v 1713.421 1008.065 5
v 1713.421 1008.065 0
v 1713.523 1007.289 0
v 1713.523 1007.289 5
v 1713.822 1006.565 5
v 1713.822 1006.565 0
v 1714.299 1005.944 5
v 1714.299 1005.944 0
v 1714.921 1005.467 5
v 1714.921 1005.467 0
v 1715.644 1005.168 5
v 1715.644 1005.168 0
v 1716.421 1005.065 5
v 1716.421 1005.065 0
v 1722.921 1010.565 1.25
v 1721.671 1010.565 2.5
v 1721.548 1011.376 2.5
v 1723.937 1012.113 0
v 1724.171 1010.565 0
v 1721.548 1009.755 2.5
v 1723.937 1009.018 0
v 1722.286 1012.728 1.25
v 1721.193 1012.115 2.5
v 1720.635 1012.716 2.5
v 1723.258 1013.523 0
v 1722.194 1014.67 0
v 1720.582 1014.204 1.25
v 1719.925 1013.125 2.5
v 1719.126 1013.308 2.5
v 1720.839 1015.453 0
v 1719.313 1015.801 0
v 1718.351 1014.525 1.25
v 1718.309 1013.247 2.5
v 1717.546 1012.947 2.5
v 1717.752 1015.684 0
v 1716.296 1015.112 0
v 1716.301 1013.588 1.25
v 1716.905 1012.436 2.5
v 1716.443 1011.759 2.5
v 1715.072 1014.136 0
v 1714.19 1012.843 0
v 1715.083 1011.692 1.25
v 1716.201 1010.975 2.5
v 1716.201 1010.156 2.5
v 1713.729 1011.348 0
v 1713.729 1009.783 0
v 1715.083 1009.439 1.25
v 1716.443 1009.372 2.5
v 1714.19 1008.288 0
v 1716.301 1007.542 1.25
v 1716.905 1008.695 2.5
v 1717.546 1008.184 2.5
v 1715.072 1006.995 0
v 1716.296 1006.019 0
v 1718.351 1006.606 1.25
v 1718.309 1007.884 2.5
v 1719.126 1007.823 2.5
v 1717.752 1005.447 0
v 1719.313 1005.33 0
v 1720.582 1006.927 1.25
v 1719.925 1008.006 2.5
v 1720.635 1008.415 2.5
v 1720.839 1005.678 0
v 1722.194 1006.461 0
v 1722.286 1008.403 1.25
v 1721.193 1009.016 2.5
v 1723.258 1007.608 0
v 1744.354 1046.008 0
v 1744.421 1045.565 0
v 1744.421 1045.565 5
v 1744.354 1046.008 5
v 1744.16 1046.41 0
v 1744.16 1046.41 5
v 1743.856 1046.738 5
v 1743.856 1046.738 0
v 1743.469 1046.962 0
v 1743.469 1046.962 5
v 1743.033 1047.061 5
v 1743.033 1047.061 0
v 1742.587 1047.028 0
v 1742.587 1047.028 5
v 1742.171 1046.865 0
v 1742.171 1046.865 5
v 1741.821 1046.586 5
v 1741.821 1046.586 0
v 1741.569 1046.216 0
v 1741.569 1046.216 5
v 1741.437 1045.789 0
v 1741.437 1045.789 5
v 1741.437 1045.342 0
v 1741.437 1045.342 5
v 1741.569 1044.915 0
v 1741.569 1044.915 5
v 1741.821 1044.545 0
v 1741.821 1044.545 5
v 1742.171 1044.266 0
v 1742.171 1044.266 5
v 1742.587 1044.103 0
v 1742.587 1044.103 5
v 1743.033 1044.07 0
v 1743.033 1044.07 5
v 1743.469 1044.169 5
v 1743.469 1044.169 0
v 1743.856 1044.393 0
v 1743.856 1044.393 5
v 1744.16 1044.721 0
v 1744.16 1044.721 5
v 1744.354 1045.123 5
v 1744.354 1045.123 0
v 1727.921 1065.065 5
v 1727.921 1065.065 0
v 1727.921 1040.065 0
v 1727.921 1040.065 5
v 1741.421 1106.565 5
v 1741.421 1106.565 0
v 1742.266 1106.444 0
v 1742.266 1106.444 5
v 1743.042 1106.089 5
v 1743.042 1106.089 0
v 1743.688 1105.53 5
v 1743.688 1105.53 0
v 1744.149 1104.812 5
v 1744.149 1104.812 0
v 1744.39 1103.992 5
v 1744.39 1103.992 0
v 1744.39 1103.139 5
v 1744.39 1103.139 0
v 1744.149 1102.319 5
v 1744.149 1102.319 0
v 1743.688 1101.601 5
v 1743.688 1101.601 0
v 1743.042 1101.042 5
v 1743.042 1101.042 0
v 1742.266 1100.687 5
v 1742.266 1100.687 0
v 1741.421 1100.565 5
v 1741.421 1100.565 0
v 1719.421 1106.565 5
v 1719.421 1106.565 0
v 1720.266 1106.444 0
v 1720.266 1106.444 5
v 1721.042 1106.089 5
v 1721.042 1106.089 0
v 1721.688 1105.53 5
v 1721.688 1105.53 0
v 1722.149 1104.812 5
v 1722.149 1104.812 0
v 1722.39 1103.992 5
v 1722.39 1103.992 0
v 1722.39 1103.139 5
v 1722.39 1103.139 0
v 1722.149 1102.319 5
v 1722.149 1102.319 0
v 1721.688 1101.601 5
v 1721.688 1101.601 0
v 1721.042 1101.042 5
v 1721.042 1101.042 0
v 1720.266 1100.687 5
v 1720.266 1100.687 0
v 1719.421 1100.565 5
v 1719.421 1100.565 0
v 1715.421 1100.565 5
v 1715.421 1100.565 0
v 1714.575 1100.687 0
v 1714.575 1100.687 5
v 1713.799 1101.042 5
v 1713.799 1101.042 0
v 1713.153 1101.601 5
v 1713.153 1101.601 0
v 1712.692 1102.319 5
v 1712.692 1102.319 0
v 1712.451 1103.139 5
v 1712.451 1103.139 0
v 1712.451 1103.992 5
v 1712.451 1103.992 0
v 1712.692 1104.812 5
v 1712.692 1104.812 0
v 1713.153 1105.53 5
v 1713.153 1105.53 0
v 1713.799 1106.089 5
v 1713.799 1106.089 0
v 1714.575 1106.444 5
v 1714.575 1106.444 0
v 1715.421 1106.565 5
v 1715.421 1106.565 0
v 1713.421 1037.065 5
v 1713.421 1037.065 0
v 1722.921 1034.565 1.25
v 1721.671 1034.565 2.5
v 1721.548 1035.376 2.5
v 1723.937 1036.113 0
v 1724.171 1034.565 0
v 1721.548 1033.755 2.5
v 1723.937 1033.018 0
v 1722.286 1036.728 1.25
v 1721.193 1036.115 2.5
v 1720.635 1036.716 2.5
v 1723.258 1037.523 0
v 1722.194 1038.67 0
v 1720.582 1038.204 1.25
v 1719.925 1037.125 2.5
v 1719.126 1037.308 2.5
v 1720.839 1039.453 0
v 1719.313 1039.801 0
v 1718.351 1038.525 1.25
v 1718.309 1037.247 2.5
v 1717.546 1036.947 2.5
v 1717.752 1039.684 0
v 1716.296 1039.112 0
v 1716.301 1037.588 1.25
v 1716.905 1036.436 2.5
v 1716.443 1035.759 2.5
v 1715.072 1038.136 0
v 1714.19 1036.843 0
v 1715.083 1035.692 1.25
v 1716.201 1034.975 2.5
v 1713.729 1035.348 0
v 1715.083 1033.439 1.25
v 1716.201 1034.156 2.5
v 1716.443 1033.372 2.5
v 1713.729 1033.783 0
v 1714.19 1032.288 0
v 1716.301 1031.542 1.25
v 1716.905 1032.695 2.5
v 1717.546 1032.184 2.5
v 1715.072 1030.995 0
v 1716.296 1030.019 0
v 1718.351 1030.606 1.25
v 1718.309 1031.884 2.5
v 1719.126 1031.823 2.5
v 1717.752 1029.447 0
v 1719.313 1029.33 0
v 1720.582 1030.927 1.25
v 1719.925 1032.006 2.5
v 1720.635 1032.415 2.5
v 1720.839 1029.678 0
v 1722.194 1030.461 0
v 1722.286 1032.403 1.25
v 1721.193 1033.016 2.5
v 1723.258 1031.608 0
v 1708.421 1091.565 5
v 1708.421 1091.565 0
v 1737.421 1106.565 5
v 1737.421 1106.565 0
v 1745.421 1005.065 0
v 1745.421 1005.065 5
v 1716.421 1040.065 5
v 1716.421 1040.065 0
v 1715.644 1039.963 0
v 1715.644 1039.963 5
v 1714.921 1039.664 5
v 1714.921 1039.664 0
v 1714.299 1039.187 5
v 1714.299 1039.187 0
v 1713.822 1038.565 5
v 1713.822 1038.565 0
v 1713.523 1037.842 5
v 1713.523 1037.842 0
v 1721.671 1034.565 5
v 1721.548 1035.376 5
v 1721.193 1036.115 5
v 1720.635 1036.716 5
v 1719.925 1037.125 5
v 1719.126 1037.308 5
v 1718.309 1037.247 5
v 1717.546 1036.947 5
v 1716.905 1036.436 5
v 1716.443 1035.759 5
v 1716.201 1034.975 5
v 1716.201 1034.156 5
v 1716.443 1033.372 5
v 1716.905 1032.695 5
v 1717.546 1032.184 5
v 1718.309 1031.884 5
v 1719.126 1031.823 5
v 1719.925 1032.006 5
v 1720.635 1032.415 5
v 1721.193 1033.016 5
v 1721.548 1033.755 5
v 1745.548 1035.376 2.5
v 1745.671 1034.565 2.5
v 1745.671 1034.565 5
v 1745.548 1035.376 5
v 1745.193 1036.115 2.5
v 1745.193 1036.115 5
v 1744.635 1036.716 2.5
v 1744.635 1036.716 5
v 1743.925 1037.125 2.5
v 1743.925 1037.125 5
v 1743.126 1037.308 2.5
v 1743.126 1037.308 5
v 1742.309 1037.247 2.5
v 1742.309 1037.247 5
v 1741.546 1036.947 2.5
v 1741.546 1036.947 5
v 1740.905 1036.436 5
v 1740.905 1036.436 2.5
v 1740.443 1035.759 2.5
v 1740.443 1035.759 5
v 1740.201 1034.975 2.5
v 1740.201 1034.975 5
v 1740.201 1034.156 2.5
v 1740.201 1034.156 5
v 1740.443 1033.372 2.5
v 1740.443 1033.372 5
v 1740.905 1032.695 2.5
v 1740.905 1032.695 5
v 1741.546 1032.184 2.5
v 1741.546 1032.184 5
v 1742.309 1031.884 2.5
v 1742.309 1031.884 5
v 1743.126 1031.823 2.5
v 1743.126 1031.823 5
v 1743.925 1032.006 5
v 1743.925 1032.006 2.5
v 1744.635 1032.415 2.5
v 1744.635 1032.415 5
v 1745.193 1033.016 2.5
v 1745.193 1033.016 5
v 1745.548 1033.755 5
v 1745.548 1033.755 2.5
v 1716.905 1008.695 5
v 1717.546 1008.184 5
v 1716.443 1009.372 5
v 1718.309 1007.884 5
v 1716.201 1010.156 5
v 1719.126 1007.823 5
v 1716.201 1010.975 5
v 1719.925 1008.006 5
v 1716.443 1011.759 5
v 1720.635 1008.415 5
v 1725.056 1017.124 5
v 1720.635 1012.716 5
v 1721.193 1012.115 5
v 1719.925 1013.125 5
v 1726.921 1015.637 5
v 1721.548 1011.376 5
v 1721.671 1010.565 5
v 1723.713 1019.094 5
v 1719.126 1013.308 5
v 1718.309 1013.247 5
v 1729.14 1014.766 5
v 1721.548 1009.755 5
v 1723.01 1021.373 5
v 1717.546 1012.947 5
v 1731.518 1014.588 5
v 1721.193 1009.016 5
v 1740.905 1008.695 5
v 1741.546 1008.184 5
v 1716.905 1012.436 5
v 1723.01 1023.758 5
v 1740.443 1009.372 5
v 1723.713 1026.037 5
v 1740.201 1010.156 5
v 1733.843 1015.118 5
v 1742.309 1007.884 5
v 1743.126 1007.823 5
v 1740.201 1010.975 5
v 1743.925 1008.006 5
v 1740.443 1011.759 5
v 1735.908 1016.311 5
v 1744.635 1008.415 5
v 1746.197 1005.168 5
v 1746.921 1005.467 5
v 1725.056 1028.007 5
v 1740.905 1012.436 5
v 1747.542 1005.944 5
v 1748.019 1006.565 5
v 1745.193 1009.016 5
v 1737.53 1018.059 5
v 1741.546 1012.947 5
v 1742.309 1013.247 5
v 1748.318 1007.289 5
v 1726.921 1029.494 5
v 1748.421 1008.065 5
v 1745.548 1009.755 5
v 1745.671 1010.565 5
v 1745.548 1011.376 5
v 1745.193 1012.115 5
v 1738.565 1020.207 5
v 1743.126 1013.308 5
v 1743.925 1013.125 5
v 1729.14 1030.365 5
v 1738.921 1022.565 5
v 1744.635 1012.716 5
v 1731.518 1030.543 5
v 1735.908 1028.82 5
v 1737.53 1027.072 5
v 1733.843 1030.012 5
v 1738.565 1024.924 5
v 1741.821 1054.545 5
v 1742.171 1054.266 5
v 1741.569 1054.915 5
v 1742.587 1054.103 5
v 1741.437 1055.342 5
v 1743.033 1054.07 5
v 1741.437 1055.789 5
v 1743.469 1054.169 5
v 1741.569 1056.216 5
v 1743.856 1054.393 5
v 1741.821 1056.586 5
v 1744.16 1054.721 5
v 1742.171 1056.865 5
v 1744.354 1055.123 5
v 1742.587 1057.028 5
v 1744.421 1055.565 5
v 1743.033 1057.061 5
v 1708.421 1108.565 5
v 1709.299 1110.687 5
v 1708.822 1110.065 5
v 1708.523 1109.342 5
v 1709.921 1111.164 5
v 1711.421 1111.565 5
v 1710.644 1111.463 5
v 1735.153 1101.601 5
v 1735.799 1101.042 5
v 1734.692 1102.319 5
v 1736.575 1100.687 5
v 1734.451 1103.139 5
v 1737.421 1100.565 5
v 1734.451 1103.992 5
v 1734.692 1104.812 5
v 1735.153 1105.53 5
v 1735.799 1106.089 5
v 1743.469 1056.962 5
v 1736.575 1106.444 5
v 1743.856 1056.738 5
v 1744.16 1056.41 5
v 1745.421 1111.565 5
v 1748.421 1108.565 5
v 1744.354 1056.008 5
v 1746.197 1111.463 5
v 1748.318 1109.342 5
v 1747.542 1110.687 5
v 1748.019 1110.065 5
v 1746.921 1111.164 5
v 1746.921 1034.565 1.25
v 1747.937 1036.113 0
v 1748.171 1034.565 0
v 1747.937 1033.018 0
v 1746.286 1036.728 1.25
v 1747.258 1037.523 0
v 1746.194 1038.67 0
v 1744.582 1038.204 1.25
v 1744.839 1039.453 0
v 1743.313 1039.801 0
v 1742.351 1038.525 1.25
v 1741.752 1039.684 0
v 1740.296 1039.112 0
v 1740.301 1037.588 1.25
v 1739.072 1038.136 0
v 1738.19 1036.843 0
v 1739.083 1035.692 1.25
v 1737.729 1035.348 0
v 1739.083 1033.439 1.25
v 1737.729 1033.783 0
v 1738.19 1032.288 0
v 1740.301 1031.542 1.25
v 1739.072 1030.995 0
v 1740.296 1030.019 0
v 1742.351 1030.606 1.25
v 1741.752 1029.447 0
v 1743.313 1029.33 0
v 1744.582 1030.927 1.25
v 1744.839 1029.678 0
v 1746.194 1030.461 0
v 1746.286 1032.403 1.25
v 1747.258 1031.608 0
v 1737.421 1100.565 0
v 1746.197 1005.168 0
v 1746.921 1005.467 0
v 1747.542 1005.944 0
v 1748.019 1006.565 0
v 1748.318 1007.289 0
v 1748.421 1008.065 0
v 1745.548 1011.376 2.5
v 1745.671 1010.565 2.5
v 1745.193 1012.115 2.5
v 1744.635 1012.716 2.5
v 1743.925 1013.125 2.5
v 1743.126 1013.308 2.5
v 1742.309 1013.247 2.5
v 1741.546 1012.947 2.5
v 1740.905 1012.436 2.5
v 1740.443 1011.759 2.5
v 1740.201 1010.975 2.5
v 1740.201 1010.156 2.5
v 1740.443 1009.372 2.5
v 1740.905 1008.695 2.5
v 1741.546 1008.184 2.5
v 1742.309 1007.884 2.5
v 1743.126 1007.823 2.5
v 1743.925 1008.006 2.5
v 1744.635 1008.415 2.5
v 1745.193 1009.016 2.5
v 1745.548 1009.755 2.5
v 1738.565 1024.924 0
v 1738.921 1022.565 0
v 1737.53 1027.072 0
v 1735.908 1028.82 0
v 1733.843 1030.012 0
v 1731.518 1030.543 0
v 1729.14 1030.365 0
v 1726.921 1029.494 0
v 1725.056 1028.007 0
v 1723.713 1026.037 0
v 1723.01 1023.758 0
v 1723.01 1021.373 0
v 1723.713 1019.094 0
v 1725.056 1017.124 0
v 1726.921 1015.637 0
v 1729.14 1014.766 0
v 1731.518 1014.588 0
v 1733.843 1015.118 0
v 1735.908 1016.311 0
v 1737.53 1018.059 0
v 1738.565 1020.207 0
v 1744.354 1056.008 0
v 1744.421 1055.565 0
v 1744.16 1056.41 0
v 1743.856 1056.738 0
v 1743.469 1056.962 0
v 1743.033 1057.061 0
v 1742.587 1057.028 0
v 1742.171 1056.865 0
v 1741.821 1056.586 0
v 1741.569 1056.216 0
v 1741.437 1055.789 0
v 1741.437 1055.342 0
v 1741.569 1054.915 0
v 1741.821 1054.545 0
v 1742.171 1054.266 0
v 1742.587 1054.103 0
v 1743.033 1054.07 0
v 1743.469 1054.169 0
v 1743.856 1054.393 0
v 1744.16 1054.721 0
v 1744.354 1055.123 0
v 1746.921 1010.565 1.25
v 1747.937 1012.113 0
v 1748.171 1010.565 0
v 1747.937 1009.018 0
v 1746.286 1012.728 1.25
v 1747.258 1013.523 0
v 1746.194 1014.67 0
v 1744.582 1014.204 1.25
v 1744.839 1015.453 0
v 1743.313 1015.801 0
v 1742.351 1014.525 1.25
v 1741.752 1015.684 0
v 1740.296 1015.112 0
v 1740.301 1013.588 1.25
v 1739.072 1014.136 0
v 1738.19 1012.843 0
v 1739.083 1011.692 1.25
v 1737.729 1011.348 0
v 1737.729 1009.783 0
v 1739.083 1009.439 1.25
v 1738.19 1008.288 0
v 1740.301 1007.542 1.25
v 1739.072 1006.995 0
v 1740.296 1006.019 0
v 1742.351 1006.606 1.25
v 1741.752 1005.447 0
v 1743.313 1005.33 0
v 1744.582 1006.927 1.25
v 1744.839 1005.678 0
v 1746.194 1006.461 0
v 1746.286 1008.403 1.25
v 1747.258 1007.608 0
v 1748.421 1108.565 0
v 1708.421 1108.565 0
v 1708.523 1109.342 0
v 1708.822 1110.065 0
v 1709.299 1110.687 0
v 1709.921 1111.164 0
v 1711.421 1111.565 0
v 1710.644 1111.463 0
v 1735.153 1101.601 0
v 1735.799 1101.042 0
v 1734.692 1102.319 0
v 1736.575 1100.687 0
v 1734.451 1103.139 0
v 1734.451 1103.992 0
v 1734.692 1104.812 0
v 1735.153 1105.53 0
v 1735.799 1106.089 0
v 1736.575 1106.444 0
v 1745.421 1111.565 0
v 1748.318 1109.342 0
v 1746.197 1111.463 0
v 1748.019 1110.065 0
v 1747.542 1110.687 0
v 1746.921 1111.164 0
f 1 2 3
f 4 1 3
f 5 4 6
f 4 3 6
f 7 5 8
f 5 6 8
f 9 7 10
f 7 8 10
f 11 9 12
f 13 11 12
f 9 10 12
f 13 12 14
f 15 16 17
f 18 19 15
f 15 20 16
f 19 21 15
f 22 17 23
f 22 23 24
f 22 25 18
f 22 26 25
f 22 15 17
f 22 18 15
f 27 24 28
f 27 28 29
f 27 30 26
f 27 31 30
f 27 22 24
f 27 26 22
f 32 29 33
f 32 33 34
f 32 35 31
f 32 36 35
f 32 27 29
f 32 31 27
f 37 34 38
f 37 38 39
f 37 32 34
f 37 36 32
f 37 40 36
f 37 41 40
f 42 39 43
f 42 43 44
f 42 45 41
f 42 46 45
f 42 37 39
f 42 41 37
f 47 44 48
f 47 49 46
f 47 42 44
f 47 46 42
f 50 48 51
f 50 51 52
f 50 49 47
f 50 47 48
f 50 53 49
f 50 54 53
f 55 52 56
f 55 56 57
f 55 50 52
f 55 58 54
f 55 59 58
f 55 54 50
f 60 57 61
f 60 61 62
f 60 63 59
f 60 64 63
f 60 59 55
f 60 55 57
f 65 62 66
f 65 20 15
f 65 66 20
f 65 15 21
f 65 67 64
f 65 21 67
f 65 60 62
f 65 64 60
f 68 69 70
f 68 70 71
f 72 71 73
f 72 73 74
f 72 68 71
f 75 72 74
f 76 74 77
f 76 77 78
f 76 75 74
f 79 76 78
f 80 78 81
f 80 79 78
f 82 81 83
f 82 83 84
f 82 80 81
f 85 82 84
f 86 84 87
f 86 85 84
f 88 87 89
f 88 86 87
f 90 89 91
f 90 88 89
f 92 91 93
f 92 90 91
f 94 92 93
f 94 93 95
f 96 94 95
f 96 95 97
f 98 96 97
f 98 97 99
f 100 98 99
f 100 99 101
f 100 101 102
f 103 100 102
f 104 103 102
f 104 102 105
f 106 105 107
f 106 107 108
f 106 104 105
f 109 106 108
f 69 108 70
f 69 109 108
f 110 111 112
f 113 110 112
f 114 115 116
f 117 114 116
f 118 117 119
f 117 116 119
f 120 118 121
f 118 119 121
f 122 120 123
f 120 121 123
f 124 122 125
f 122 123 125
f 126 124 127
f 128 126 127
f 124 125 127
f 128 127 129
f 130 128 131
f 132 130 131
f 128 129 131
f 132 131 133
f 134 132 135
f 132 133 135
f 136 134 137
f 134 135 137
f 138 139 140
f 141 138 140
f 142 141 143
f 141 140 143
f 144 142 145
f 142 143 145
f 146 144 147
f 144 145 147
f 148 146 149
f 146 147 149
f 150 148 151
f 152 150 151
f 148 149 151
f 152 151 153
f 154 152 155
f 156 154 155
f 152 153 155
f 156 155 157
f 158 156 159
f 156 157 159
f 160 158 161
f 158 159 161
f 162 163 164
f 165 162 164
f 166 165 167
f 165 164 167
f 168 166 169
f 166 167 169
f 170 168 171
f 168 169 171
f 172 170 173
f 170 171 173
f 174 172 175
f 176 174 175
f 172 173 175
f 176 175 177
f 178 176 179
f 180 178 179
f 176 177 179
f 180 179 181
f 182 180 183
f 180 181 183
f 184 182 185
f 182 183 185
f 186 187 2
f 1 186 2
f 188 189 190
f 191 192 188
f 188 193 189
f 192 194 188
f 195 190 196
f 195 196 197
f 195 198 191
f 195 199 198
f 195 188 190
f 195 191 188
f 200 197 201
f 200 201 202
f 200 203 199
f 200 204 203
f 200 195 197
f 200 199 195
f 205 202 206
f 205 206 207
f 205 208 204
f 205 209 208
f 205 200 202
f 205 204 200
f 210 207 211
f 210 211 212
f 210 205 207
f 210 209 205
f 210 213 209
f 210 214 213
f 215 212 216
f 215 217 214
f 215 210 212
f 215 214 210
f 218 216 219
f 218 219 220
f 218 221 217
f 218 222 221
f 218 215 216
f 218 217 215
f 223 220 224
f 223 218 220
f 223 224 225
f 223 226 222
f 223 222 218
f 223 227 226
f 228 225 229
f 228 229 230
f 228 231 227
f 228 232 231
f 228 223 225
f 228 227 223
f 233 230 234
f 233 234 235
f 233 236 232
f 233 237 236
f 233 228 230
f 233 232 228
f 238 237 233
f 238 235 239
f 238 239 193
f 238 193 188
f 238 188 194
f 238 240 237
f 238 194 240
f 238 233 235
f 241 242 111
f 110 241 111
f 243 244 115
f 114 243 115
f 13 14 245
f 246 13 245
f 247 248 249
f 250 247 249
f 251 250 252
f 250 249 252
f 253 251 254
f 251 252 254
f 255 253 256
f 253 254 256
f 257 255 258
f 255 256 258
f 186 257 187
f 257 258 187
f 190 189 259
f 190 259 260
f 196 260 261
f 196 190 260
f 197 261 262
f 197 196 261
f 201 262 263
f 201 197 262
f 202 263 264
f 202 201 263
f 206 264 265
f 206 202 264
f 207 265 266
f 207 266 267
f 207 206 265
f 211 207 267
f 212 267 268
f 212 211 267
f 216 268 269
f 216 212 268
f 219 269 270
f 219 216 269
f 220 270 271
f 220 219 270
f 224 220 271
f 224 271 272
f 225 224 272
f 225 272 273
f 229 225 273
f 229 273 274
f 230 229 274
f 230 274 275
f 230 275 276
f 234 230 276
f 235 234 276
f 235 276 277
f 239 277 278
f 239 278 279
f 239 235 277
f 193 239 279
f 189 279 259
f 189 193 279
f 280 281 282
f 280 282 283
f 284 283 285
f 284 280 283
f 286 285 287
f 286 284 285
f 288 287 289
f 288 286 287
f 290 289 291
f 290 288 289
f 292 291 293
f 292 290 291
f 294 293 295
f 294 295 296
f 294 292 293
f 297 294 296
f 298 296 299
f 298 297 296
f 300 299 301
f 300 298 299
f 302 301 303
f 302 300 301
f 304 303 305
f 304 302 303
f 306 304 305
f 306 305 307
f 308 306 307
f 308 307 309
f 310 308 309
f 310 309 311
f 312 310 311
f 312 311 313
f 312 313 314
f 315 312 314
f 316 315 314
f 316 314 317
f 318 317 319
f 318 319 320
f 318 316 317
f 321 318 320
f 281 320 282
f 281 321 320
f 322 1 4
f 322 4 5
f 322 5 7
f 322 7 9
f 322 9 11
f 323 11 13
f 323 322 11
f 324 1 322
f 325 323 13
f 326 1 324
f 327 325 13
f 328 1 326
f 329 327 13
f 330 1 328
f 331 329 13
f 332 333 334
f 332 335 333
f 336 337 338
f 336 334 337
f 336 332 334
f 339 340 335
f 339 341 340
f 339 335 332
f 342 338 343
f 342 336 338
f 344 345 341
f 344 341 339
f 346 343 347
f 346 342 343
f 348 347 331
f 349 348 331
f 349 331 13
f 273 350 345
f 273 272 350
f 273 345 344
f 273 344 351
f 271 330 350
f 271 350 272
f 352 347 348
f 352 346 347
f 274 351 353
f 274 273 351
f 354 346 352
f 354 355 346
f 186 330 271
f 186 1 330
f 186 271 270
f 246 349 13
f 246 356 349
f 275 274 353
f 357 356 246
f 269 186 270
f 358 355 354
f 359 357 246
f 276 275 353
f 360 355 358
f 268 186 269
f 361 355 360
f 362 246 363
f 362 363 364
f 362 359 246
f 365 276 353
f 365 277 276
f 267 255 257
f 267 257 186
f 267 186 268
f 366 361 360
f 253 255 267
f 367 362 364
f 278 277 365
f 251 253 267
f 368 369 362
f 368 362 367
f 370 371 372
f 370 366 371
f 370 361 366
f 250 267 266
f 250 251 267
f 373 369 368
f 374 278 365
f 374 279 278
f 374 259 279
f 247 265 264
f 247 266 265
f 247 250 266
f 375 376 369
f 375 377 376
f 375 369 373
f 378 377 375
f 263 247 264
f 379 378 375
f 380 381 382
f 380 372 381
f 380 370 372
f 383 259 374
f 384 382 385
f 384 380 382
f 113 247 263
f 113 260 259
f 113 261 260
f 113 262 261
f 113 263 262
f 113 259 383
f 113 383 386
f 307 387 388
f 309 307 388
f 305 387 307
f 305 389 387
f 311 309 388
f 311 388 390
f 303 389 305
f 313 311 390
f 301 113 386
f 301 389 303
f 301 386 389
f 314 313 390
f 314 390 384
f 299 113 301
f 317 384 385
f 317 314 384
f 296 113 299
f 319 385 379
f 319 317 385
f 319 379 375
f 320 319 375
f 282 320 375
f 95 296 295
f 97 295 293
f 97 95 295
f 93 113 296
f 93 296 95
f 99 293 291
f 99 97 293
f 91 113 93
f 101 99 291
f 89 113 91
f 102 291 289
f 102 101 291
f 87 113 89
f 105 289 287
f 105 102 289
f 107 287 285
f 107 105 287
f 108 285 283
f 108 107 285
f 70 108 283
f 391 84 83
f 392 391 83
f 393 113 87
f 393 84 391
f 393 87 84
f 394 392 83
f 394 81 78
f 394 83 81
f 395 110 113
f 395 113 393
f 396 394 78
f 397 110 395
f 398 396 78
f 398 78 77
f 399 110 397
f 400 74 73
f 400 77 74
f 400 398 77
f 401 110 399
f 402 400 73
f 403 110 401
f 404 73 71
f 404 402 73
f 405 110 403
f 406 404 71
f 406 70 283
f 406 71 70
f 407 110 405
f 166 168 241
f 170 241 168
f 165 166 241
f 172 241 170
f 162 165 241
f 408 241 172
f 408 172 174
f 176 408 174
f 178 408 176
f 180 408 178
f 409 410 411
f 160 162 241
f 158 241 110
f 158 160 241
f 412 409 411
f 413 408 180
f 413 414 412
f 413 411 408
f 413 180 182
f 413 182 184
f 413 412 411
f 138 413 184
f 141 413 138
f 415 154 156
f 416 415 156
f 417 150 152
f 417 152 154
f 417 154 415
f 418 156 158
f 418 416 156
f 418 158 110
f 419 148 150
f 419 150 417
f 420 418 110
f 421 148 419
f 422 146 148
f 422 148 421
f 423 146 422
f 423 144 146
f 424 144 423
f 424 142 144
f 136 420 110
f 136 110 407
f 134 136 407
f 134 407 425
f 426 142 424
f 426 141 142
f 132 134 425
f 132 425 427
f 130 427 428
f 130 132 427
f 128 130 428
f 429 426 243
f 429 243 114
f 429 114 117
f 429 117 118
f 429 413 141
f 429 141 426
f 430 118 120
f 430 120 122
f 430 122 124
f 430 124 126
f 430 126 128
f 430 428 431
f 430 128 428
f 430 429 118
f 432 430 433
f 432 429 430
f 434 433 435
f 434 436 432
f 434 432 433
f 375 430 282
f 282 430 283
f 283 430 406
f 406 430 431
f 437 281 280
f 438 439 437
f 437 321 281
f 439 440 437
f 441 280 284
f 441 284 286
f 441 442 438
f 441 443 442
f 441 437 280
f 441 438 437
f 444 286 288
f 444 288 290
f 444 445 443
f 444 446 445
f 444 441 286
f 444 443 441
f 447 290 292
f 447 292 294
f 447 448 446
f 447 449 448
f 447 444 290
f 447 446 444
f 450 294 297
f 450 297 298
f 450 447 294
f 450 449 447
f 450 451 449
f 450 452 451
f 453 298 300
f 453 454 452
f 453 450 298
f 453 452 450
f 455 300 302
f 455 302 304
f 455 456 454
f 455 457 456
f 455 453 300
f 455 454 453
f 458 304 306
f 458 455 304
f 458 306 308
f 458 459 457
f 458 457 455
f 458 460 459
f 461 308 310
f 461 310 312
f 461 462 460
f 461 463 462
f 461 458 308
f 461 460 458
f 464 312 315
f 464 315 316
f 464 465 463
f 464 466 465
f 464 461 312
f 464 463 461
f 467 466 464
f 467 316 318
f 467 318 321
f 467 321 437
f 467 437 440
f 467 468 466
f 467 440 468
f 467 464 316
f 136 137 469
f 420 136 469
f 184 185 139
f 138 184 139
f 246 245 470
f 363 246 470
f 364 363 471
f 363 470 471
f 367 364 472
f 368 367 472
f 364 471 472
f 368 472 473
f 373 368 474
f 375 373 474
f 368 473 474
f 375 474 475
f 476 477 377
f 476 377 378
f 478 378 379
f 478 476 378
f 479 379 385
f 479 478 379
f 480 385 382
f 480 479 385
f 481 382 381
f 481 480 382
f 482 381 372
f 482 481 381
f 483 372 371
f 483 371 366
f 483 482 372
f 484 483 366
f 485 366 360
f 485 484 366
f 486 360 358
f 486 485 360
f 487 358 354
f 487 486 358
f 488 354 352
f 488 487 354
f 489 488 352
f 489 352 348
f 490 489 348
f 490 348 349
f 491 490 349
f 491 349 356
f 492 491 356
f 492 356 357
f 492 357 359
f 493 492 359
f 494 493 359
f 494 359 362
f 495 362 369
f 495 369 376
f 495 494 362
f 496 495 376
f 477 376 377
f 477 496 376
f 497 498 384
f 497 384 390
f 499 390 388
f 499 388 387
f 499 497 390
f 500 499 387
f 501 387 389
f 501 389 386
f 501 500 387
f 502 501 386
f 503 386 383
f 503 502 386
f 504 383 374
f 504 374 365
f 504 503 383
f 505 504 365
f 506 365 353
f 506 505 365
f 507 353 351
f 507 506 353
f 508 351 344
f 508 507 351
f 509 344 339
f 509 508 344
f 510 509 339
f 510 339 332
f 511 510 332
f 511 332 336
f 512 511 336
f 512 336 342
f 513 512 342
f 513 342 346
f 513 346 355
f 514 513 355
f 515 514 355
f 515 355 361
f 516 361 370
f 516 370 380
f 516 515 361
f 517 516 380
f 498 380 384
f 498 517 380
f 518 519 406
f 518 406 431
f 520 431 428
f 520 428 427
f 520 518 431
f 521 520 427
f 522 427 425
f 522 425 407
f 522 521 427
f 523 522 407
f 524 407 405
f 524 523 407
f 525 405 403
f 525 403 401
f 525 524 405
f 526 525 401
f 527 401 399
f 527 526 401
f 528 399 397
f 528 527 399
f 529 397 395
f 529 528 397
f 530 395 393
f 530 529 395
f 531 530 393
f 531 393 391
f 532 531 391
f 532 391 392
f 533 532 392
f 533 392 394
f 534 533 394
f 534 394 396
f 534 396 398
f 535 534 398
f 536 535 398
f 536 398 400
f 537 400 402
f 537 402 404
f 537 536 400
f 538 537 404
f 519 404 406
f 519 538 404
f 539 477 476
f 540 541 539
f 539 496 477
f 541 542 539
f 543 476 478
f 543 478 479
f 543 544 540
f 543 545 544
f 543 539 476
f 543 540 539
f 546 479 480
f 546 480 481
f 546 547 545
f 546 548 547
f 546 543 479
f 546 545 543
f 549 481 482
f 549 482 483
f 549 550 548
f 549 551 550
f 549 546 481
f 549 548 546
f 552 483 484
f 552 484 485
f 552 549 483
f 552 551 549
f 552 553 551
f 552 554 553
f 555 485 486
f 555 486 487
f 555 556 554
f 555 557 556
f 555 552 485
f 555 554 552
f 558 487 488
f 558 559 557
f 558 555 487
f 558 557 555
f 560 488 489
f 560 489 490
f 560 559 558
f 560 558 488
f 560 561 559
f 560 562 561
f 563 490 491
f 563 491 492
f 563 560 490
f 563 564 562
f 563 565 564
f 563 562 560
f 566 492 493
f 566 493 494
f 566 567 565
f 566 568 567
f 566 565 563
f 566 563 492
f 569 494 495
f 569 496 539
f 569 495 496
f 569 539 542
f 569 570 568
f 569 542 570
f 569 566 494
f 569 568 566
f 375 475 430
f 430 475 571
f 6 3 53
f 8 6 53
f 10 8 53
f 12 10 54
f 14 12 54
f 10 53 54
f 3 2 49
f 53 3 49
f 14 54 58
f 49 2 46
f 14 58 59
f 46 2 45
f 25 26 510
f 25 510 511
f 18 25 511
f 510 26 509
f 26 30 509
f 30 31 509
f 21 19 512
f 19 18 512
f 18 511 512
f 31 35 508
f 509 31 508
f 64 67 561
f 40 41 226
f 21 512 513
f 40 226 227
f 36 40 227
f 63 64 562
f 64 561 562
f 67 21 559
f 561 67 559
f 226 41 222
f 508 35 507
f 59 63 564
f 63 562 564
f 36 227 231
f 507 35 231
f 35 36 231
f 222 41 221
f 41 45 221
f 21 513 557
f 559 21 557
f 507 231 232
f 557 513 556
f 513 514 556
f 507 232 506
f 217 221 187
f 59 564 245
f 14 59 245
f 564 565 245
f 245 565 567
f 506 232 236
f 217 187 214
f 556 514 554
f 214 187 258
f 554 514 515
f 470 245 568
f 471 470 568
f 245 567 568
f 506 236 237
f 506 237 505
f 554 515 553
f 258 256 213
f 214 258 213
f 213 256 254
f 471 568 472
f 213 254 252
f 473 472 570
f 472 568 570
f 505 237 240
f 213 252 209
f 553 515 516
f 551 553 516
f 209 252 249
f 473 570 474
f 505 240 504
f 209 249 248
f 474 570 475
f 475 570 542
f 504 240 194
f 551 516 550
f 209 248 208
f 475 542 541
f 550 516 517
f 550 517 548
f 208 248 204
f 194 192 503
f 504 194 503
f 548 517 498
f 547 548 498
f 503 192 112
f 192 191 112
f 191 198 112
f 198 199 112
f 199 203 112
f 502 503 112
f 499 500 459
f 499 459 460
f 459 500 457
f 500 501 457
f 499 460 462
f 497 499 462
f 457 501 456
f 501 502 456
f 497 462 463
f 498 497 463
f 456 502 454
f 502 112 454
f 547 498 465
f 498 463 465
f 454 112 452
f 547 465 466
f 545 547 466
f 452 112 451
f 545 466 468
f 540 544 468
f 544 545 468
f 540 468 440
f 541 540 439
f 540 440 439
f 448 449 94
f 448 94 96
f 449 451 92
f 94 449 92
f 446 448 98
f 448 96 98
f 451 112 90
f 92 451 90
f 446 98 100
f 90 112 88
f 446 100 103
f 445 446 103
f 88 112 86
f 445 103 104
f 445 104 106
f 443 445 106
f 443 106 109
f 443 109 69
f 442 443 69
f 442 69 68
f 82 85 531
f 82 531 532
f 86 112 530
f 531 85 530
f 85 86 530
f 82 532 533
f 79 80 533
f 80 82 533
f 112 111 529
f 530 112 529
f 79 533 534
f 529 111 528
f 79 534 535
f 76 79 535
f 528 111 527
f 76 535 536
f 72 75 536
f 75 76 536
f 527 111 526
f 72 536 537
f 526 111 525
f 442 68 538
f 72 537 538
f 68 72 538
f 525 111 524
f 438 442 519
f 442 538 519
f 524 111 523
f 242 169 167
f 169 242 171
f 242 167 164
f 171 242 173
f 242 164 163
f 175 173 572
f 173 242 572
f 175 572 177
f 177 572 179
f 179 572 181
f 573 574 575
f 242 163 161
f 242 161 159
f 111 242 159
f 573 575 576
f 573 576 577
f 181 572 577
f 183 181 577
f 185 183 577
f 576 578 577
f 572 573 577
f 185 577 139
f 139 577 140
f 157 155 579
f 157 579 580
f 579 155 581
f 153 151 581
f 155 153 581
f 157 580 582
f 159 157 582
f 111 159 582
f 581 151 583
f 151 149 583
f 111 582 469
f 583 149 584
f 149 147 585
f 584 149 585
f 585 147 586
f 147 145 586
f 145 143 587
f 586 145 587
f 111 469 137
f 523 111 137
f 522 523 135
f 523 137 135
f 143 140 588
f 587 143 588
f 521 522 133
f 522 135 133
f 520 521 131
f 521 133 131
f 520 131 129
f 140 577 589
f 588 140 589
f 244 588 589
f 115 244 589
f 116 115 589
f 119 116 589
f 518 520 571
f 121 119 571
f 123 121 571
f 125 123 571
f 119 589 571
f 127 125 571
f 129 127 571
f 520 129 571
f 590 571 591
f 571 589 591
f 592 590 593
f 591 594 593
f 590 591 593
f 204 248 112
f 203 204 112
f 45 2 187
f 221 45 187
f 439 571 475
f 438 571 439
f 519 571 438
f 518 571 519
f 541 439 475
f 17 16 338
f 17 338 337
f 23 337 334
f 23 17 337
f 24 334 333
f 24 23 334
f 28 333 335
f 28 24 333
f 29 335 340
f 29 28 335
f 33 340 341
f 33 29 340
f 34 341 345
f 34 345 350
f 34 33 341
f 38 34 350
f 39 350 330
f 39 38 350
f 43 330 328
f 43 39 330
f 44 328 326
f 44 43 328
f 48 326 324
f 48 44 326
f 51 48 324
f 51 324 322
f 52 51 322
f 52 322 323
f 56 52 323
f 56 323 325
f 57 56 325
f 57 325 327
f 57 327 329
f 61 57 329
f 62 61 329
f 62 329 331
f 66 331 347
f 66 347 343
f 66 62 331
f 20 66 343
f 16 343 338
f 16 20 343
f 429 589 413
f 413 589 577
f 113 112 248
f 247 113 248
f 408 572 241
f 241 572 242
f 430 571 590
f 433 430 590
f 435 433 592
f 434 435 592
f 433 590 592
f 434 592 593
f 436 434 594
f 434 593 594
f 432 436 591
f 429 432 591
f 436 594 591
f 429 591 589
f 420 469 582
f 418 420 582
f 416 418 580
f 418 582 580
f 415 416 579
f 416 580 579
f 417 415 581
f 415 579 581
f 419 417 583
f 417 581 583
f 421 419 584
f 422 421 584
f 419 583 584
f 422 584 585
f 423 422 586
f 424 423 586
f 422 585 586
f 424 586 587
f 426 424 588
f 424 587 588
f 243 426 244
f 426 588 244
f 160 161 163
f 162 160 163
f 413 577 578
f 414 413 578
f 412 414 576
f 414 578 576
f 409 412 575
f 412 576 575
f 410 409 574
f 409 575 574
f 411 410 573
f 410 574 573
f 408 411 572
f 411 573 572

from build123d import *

# Parameters (mm, degrees)
SKETCH_1_R      = 2.75
SKETCH_1_R_2    = 8
SKETCH_1_R_3    = 1.5
EXTRUDE_1_DEPTH = 5
CHAMFER_1_SIZE  = 2.5


with BuildPart() as part:
    # 草图1 → 拉伸1 (new body)
    with BuildSketch(Plane.XY):
        with BuildLine():
            Line((1708.420547593, 1108.565488817), (1708.420547593, 1091.565488817))
            Line((1708.420547593, 1091.565488817), (1727.920547593, 1065.065488817))
            Line((1727.920547593, 1065.065488817), (1727.920547593, 1040.065488817))
            Line((1727.920547593, 1040.065488817), (1716.420547593, 1040.065488817))
            ThreePointArc((1716.420547593, 1040.065488817), (1714.29922725, 1039.186809161), (1713.420547593, 1037.065488817))
            Line((1713.420547593, 1037.065488817), (1713.420547593, 1008.065488817))
            ThreePointArc((1713.420547593, 1008.065488817), (1714.29922725, 1005.944168474), (1716.420547593, 1005.065488817))
            Line((1716.420547593, 1005.065488817), (1745.420547593, 1005.065488817))
            ThreePointArc((1745.420547593, 1005.065488817), (1747.541867937, 1005.944168474), (1748.420547593, 1008.065488817))
            Line((1748.420547593, 1008.065488817), (1748.420547593, 1108.565488817))
            ThreePointArc((1748.420547593, 1108.565488817), (1747.541867937, 1110.686809161), (1745.420547593, 1111.565488817))
            Line((1745.420547593, 1111.565488817), (1711.420547593, 1111.565488817))
            ThreePointArc((1711.420547593, 1111.565488817), (1709.29922725, 1110.686809161), (1708.420547593, 1108.565488817))
        make_face()
        with Locations((1718.920547593, 1010.565488817)):
            Circle(SKETCH_1_R, mode=Mode.SUBTRACT)
        with Locations((1718.920547593, 1034.565488817)):
            Circle(SKETCH_1_R, mode=Mode.SUBTRACT)
        with Locations((1730.920547593, 1022.565488817)):
            Circle(SKETCH_1_R_2, mode=Mode.SUBTRACT)
        with Locations((1742.920547593, 1010.565488817)):
            Circle(SKETCH_1_R, mode=Mode.SUBTRACT)
        with Locations((1742.920547593, 1034.565488817)):
            Circle(SKETCH_1_R, mode=Mode.SUBTRACT)
        with Locations((1742.920547593, 1045.565488817)):
            Circle(SKETCH_1_R_3, mode=Mode.SUBTRACT)
        with Locations((1742.920547593, 1055.565488817)):
            Circle(SKETCH_1_R_3, mode=Mode.SUBTRACT)
        with BuildLine():
            Line((1715.420547593, 1106.565488817), (1719.420547593, 1106.565488817))
            ThreePointArc((1719.420547593, 1106.565488817), (1722.420547593, 1103.565488817), (1719.420547593, 1100.565488817))
            Line((1719.420547593, 1100.565488817), (1715.420547593, 1100.565488817))
            ThreePointArc((1715.420547593, 1100.565488817), (1712.420547593, 1103.565488817), (1715.420547593, 1106.565488817))
        make_face(mode=Mode.SUBTRACT)
        with BuildLine():
            ThreePointArc((1737.420547593, 1100.565488817), (1734.420547593, 1103.565488817), (1737.420547593, 1106.565488817))
            Line((1737.420547593, 1106.565488817), (1741.420547593, 1106.565488817))
            ThreePointArc((1741.420547593, 1106.565488817), (1744.420547593, 1103.565488817), (1741.420547593, 1100.565488817))
            Line((1741.420547593, 1100.565488817), (1737.420547593, 1100.565488817))
        make_face(mode=Mode.SUBTRACT)
    extrude(amount=EXTRUDE_1_DEPTH)

    # 倒角1
    chamfer_1_edges = [part.edges().sort_by_distance(p)[0] for p in [
        (1740.170547593, 1034.565488817, 0),
        (1740.170547593, 1010.565488817, 0),
        (1716.170547593, 1010.565488817, 0),
        (1716.170547593, 1034.565488817, 0),
    ]]
    chamfer(chamfer_1_edges, length=CHAMFER_1_SIZE)


solid = part.part
